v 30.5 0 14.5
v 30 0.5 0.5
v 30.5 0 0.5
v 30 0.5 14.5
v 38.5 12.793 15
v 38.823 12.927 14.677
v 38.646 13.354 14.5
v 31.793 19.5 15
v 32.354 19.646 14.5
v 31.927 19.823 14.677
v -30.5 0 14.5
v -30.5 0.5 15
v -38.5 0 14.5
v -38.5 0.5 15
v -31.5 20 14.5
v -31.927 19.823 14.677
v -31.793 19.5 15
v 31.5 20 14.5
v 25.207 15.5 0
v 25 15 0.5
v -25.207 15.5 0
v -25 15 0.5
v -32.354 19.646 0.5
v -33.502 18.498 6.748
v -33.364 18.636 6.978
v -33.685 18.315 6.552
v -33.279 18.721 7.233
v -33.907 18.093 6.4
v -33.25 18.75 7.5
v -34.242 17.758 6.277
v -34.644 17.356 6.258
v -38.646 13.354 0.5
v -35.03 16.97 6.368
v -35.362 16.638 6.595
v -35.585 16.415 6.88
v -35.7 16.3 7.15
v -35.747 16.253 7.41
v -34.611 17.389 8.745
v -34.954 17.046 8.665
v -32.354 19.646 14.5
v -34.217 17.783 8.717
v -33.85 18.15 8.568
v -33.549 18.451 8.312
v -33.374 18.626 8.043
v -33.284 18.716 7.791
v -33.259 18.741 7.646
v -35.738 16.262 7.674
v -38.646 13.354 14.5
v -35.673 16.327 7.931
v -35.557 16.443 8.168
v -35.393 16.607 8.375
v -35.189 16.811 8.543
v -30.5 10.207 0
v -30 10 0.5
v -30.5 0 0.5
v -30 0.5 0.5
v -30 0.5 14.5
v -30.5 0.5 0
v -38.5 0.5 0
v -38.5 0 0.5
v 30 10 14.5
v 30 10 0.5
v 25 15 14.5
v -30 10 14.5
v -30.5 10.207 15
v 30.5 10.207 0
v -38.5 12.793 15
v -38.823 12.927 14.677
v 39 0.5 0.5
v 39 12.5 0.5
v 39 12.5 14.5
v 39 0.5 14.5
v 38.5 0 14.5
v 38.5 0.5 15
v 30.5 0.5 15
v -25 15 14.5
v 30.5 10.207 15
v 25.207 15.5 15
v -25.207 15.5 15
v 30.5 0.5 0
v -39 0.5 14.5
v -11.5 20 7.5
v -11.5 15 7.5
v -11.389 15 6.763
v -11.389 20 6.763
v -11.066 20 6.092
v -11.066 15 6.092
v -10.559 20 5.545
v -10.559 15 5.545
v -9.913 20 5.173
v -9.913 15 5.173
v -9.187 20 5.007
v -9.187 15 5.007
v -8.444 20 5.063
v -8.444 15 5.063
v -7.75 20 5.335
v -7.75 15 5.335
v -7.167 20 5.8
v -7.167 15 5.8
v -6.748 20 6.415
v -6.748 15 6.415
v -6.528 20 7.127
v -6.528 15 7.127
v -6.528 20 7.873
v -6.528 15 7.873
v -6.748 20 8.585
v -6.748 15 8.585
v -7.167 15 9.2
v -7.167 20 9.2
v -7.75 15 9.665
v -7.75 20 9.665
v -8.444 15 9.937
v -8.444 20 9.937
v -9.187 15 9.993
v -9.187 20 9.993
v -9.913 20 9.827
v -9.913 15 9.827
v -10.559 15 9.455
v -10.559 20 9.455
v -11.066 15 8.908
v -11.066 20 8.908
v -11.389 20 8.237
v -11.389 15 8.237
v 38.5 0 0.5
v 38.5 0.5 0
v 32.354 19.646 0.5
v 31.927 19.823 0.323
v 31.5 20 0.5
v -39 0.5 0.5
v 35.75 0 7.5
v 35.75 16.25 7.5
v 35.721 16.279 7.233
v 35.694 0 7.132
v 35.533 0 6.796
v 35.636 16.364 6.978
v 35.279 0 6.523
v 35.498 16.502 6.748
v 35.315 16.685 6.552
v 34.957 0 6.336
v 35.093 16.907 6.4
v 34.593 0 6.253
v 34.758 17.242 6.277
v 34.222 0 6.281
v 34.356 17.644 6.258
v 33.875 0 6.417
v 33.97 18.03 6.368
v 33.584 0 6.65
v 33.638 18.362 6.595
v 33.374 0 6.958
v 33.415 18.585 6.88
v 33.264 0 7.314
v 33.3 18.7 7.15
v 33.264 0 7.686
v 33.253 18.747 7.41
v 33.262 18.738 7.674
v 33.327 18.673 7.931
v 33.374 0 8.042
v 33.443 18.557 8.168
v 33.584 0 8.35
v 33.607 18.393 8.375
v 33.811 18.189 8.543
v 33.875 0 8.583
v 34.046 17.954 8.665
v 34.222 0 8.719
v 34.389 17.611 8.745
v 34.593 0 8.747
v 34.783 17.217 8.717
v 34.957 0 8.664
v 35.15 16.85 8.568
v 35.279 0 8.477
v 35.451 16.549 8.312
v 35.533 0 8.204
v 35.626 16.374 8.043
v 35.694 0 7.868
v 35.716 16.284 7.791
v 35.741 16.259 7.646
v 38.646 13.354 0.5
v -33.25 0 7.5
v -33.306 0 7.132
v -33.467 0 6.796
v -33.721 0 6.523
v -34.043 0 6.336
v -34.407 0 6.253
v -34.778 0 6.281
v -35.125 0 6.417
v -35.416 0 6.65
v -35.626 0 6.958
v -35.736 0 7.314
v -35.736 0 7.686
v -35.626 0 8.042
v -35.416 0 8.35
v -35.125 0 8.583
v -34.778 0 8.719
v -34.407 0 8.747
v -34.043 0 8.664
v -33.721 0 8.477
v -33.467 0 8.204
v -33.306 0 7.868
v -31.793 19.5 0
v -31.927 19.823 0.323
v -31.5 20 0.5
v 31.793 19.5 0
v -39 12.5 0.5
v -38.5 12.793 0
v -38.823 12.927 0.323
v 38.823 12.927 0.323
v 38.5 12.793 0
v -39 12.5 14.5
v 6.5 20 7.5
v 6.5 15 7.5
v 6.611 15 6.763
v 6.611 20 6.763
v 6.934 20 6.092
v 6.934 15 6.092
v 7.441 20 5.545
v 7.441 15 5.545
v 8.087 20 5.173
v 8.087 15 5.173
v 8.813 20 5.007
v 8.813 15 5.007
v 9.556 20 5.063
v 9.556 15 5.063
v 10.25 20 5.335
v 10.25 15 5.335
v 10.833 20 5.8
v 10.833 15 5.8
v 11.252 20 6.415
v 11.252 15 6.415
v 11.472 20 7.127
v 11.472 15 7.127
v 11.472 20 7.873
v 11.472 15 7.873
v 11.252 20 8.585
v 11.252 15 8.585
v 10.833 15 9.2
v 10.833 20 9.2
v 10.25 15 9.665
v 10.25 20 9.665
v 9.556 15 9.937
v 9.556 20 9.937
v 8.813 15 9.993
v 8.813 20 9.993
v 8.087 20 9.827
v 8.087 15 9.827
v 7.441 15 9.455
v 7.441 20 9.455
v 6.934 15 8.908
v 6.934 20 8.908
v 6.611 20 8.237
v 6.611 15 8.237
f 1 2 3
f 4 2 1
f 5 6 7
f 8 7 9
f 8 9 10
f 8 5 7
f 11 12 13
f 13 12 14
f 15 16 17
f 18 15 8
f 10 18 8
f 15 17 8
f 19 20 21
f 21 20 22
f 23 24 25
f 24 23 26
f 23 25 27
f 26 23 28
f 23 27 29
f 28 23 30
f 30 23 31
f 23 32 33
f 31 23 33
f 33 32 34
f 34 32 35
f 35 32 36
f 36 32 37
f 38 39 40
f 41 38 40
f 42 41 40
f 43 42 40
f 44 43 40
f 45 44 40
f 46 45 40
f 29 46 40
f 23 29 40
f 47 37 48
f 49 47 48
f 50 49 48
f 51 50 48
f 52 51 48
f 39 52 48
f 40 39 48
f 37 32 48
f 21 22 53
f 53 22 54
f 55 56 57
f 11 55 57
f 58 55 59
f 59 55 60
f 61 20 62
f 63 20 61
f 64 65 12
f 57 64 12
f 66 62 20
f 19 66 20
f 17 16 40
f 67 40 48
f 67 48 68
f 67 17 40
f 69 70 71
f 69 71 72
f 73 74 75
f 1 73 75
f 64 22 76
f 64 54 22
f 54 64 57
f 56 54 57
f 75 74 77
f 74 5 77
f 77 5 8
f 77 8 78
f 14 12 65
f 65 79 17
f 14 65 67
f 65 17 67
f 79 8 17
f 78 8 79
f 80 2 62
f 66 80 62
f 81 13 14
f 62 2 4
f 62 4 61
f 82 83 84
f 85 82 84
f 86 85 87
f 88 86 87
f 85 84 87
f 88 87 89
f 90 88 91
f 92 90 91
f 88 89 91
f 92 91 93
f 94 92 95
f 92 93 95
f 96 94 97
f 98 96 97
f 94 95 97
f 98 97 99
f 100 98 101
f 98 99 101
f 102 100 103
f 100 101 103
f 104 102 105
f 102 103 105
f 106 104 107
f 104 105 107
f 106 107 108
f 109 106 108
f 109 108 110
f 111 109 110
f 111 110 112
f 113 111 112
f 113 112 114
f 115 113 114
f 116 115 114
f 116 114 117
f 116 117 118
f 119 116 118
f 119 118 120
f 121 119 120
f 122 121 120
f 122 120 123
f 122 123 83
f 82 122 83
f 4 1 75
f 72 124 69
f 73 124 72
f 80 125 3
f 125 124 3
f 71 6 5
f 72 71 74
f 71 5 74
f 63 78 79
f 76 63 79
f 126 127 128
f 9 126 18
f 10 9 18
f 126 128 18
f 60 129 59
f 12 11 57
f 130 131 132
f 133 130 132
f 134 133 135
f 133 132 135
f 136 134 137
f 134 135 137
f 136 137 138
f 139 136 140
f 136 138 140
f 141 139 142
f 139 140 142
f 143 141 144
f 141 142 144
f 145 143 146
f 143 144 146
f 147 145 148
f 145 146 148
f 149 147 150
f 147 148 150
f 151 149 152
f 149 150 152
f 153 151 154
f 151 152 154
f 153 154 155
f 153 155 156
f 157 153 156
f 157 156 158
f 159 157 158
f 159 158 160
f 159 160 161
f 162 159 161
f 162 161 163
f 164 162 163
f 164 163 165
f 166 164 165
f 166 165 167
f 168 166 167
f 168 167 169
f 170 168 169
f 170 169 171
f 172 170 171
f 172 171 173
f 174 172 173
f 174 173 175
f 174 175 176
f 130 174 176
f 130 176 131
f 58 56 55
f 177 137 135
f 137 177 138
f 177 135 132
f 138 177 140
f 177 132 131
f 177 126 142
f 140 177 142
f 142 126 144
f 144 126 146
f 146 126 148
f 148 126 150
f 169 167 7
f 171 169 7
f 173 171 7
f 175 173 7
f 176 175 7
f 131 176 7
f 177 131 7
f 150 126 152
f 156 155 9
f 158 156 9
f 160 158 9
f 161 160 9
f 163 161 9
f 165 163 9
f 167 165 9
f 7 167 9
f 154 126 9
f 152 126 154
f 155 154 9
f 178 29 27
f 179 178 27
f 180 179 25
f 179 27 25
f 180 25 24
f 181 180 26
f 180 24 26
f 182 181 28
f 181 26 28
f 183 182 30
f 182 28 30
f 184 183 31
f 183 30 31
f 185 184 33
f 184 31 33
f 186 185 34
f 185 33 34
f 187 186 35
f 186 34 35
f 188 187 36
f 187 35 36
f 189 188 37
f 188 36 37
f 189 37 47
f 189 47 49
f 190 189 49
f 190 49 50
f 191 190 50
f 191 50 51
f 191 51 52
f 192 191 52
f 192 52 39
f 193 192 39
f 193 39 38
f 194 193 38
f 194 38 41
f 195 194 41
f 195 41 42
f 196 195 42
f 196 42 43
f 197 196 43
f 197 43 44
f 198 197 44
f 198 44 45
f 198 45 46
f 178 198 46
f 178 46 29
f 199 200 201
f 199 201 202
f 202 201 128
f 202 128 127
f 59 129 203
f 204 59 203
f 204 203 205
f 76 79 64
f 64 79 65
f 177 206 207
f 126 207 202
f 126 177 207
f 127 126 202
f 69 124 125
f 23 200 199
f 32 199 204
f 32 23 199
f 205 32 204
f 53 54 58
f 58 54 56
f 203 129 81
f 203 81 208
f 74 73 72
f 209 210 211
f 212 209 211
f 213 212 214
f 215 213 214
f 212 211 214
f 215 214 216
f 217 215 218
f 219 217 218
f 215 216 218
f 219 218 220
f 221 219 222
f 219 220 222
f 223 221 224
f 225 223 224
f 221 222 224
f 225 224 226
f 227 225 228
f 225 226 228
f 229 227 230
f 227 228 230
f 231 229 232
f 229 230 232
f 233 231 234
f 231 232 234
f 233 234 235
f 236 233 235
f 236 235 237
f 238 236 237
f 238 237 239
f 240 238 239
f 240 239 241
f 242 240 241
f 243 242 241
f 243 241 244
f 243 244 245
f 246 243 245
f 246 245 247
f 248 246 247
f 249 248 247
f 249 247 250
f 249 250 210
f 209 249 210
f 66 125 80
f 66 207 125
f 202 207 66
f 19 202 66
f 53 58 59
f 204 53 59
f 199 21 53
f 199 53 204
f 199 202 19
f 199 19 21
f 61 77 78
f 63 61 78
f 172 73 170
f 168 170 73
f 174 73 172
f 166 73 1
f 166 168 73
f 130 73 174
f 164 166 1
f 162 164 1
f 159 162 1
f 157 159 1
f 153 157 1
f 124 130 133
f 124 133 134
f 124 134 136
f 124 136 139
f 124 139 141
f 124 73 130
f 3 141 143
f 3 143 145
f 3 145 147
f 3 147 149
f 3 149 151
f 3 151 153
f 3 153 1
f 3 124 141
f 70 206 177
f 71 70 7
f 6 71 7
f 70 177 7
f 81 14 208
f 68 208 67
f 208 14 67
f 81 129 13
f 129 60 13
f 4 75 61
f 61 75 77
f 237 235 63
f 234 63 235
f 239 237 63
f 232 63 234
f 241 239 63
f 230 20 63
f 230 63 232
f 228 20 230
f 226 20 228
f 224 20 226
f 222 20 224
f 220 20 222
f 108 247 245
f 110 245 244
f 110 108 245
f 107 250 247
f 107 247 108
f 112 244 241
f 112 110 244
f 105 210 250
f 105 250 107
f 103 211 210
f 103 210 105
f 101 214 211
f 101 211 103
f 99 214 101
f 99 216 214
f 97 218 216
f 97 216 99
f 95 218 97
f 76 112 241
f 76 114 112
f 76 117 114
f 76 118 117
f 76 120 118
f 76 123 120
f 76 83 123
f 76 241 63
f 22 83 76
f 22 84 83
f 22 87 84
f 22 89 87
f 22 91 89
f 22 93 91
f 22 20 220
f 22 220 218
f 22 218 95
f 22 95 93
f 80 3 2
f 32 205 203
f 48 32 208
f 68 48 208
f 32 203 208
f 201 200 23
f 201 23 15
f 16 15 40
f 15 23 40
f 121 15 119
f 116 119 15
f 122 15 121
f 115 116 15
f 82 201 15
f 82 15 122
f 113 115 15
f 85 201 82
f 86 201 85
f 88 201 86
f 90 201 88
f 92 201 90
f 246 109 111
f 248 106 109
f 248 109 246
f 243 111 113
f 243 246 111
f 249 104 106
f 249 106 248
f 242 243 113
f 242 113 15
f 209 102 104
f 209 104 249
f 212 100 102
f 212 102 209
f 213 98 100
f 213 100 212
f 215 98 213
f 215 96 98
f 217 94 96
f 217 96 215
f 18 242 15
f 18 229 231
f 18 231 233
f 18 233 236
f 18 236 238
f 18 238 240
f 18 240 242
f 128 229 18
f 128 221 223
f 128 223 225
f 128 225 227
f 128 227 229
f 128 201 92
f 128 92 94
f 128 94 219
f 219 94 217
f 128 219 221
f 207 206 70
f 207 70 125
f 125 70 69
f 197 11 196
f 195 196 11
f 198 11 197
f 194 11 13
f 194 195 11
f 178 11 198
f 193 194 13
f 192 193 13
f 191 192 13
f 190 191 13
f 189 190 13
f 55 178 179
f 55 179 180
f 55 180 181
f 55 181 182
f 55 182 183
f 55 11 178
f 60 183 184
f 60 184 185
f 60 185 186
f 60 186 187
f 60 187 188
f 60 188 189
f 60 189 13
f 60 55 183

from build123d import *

# Parameters (mm, degrees)
BOSS_EXTRU_1_DEPTH      = 15
CHANFREIN1_SIZE         = 5
CHANFREIN2_SIZE         = 7
TROU_TARAUD_M6X1_01_D   = 5
TROU_TARAUD_M3X0_51_D   = 2.5
CHANFREIN6_SIZE         = 0.5
CHANFREIN10_SIZE        = 0.5
CHANFREIN10_EDGE_2_SIZE = 0.5
CHANFREIN10_EDGE_3_SIZE = 0.5
CHANFREIN10_EDGE_4_SIZE = 0.5


with BuildPart() as part:
    # Esquisse1 → Boss.-Extru.1 (new body)
    with BuildSketch(Plane.XY):
        Polygon((-30, 0), (-39, 0), (-39, 20), (39, 20), (39, 0), (30, 0), (30, 15), (-30, 15), align=None)
    extrude(amount=BOSS_EXTRU_1_DEPTH)

    # Chanfrein1
    chanfrein1_edges = [part.edges().sort_by_distance(p)[0] for p in [
        (30, 15, 7.5),
        (-30, 15, 7.5),
    ]]
    chamfer(chanfrein1_edges, length=CHANFREIN1_SIZE)

    # Chanfrein2
    chanfrein2_edges = [part.edges().sort_by_distance(p)[0] for p in [
        (-39, 20, 7.5),
        (39, 20, 7.5),
    ]]
    chamfer(chanfrein2_edges, length=CHANFREIN2_SIZE)

    # Trou taraudé M6x1.01 (through all)
    with Locations(Plane(origin=(0, 20, 0), x_dir=(1, 0, 0), z_dir=(0, 1, 0))):
        with Locations((9, -7.5), (-9, -7.5)):
            Hole(TROU_TARAUD_M6X1_01_D / 2)

    # Trou taraudé M3x0.51 (through all)
    with Locations(Plane(origin=(0, 0, 0), x_dir=(-1, 0, 0), z_dir=(0, -1, 0))):
        with Locations((-34.5, -7.5), (34.5, -7.5)):
            Hole(TROU_TARAUD_M3X0_51_D / 2)

    # Chanfrein6
    chanfrein6_edges = [part.edges().sort_by_distance(p)[0] for p in [
        (34.5, 0, 0),
        (-30, 5, 0),
        (-30, 0, 7.5),
        (-39, 0, 7.5),
        (39, 0, 7.5),
        (30, 0, 7.5),
        (34.5, 0, 15),
        (39, 6.5, 15),
        (0, 15, 0),
        (0, 15, 15),
        (30, 5, 0),
        (30, 5, 15),
        (-27.5, 12.5, 0),
        (-27.5, 12.5, 15),
        (27.5, 12.5, 0),
        (27.5, 12.5, 15),
        (-34.5, 0, 15),
        (0, 20, 0),
        (0, 20, 15),
        (-39, 6.5, 0),
        (-35.5, 16.5, 0),
        (35.5, 16.5, 0),
        (-39, 6.5, 15),
        (-35.5, 16.5, 15),
        (35.5, 16.5, 15),
        (-30, 5, 15),
        (-34.5, 0, 0),
        (39, 6.5, 0),
    ]]
    chamfer(chanfrein6_edges, length=CHANFREIN6_SIZE)

    # Chanfrein10
    chanfrein10_edges = [part.edges().sort_by_distance(p)[0] for p in [
        (39, 13, 7.5),
    ]]
    chamfer(chanfrein10_edges, length=CHANFREIN10_SIZE)

    # Chanfrein10 edge 2
    chanfrein10_edge_2_edges = [part.edges().sort_by_distance(p)[0] for p in [
        (32, 20, 7.5),
    ]]
    chamfer(chanfrein10_edge_2_edges, length=CHANFREIN10_EDGE_2_SIZE)

    # Chanfrein10 edge 3
    chanfrein10_edge_3_edges = [part.edges().sort_by_distance(p)[0] for p in [
        (-32, 20, 7.5),
    ]]
    chamfer(chanfrein10_edge_3_edges, length=CHANFREIN10_EDGE_3_SIZE)

    # Chanfrein10 edge 4
    chanfrein10_edge_4_edges = [part.edges().sort_by_distance(p)[0] for p in [
        (-39, 13, 7.5),
    ]]
    chamfer(chanfrein10_edge_4_edges, length=CHANFREIN10_EDGE_4_SIZE)


solid = part.part
